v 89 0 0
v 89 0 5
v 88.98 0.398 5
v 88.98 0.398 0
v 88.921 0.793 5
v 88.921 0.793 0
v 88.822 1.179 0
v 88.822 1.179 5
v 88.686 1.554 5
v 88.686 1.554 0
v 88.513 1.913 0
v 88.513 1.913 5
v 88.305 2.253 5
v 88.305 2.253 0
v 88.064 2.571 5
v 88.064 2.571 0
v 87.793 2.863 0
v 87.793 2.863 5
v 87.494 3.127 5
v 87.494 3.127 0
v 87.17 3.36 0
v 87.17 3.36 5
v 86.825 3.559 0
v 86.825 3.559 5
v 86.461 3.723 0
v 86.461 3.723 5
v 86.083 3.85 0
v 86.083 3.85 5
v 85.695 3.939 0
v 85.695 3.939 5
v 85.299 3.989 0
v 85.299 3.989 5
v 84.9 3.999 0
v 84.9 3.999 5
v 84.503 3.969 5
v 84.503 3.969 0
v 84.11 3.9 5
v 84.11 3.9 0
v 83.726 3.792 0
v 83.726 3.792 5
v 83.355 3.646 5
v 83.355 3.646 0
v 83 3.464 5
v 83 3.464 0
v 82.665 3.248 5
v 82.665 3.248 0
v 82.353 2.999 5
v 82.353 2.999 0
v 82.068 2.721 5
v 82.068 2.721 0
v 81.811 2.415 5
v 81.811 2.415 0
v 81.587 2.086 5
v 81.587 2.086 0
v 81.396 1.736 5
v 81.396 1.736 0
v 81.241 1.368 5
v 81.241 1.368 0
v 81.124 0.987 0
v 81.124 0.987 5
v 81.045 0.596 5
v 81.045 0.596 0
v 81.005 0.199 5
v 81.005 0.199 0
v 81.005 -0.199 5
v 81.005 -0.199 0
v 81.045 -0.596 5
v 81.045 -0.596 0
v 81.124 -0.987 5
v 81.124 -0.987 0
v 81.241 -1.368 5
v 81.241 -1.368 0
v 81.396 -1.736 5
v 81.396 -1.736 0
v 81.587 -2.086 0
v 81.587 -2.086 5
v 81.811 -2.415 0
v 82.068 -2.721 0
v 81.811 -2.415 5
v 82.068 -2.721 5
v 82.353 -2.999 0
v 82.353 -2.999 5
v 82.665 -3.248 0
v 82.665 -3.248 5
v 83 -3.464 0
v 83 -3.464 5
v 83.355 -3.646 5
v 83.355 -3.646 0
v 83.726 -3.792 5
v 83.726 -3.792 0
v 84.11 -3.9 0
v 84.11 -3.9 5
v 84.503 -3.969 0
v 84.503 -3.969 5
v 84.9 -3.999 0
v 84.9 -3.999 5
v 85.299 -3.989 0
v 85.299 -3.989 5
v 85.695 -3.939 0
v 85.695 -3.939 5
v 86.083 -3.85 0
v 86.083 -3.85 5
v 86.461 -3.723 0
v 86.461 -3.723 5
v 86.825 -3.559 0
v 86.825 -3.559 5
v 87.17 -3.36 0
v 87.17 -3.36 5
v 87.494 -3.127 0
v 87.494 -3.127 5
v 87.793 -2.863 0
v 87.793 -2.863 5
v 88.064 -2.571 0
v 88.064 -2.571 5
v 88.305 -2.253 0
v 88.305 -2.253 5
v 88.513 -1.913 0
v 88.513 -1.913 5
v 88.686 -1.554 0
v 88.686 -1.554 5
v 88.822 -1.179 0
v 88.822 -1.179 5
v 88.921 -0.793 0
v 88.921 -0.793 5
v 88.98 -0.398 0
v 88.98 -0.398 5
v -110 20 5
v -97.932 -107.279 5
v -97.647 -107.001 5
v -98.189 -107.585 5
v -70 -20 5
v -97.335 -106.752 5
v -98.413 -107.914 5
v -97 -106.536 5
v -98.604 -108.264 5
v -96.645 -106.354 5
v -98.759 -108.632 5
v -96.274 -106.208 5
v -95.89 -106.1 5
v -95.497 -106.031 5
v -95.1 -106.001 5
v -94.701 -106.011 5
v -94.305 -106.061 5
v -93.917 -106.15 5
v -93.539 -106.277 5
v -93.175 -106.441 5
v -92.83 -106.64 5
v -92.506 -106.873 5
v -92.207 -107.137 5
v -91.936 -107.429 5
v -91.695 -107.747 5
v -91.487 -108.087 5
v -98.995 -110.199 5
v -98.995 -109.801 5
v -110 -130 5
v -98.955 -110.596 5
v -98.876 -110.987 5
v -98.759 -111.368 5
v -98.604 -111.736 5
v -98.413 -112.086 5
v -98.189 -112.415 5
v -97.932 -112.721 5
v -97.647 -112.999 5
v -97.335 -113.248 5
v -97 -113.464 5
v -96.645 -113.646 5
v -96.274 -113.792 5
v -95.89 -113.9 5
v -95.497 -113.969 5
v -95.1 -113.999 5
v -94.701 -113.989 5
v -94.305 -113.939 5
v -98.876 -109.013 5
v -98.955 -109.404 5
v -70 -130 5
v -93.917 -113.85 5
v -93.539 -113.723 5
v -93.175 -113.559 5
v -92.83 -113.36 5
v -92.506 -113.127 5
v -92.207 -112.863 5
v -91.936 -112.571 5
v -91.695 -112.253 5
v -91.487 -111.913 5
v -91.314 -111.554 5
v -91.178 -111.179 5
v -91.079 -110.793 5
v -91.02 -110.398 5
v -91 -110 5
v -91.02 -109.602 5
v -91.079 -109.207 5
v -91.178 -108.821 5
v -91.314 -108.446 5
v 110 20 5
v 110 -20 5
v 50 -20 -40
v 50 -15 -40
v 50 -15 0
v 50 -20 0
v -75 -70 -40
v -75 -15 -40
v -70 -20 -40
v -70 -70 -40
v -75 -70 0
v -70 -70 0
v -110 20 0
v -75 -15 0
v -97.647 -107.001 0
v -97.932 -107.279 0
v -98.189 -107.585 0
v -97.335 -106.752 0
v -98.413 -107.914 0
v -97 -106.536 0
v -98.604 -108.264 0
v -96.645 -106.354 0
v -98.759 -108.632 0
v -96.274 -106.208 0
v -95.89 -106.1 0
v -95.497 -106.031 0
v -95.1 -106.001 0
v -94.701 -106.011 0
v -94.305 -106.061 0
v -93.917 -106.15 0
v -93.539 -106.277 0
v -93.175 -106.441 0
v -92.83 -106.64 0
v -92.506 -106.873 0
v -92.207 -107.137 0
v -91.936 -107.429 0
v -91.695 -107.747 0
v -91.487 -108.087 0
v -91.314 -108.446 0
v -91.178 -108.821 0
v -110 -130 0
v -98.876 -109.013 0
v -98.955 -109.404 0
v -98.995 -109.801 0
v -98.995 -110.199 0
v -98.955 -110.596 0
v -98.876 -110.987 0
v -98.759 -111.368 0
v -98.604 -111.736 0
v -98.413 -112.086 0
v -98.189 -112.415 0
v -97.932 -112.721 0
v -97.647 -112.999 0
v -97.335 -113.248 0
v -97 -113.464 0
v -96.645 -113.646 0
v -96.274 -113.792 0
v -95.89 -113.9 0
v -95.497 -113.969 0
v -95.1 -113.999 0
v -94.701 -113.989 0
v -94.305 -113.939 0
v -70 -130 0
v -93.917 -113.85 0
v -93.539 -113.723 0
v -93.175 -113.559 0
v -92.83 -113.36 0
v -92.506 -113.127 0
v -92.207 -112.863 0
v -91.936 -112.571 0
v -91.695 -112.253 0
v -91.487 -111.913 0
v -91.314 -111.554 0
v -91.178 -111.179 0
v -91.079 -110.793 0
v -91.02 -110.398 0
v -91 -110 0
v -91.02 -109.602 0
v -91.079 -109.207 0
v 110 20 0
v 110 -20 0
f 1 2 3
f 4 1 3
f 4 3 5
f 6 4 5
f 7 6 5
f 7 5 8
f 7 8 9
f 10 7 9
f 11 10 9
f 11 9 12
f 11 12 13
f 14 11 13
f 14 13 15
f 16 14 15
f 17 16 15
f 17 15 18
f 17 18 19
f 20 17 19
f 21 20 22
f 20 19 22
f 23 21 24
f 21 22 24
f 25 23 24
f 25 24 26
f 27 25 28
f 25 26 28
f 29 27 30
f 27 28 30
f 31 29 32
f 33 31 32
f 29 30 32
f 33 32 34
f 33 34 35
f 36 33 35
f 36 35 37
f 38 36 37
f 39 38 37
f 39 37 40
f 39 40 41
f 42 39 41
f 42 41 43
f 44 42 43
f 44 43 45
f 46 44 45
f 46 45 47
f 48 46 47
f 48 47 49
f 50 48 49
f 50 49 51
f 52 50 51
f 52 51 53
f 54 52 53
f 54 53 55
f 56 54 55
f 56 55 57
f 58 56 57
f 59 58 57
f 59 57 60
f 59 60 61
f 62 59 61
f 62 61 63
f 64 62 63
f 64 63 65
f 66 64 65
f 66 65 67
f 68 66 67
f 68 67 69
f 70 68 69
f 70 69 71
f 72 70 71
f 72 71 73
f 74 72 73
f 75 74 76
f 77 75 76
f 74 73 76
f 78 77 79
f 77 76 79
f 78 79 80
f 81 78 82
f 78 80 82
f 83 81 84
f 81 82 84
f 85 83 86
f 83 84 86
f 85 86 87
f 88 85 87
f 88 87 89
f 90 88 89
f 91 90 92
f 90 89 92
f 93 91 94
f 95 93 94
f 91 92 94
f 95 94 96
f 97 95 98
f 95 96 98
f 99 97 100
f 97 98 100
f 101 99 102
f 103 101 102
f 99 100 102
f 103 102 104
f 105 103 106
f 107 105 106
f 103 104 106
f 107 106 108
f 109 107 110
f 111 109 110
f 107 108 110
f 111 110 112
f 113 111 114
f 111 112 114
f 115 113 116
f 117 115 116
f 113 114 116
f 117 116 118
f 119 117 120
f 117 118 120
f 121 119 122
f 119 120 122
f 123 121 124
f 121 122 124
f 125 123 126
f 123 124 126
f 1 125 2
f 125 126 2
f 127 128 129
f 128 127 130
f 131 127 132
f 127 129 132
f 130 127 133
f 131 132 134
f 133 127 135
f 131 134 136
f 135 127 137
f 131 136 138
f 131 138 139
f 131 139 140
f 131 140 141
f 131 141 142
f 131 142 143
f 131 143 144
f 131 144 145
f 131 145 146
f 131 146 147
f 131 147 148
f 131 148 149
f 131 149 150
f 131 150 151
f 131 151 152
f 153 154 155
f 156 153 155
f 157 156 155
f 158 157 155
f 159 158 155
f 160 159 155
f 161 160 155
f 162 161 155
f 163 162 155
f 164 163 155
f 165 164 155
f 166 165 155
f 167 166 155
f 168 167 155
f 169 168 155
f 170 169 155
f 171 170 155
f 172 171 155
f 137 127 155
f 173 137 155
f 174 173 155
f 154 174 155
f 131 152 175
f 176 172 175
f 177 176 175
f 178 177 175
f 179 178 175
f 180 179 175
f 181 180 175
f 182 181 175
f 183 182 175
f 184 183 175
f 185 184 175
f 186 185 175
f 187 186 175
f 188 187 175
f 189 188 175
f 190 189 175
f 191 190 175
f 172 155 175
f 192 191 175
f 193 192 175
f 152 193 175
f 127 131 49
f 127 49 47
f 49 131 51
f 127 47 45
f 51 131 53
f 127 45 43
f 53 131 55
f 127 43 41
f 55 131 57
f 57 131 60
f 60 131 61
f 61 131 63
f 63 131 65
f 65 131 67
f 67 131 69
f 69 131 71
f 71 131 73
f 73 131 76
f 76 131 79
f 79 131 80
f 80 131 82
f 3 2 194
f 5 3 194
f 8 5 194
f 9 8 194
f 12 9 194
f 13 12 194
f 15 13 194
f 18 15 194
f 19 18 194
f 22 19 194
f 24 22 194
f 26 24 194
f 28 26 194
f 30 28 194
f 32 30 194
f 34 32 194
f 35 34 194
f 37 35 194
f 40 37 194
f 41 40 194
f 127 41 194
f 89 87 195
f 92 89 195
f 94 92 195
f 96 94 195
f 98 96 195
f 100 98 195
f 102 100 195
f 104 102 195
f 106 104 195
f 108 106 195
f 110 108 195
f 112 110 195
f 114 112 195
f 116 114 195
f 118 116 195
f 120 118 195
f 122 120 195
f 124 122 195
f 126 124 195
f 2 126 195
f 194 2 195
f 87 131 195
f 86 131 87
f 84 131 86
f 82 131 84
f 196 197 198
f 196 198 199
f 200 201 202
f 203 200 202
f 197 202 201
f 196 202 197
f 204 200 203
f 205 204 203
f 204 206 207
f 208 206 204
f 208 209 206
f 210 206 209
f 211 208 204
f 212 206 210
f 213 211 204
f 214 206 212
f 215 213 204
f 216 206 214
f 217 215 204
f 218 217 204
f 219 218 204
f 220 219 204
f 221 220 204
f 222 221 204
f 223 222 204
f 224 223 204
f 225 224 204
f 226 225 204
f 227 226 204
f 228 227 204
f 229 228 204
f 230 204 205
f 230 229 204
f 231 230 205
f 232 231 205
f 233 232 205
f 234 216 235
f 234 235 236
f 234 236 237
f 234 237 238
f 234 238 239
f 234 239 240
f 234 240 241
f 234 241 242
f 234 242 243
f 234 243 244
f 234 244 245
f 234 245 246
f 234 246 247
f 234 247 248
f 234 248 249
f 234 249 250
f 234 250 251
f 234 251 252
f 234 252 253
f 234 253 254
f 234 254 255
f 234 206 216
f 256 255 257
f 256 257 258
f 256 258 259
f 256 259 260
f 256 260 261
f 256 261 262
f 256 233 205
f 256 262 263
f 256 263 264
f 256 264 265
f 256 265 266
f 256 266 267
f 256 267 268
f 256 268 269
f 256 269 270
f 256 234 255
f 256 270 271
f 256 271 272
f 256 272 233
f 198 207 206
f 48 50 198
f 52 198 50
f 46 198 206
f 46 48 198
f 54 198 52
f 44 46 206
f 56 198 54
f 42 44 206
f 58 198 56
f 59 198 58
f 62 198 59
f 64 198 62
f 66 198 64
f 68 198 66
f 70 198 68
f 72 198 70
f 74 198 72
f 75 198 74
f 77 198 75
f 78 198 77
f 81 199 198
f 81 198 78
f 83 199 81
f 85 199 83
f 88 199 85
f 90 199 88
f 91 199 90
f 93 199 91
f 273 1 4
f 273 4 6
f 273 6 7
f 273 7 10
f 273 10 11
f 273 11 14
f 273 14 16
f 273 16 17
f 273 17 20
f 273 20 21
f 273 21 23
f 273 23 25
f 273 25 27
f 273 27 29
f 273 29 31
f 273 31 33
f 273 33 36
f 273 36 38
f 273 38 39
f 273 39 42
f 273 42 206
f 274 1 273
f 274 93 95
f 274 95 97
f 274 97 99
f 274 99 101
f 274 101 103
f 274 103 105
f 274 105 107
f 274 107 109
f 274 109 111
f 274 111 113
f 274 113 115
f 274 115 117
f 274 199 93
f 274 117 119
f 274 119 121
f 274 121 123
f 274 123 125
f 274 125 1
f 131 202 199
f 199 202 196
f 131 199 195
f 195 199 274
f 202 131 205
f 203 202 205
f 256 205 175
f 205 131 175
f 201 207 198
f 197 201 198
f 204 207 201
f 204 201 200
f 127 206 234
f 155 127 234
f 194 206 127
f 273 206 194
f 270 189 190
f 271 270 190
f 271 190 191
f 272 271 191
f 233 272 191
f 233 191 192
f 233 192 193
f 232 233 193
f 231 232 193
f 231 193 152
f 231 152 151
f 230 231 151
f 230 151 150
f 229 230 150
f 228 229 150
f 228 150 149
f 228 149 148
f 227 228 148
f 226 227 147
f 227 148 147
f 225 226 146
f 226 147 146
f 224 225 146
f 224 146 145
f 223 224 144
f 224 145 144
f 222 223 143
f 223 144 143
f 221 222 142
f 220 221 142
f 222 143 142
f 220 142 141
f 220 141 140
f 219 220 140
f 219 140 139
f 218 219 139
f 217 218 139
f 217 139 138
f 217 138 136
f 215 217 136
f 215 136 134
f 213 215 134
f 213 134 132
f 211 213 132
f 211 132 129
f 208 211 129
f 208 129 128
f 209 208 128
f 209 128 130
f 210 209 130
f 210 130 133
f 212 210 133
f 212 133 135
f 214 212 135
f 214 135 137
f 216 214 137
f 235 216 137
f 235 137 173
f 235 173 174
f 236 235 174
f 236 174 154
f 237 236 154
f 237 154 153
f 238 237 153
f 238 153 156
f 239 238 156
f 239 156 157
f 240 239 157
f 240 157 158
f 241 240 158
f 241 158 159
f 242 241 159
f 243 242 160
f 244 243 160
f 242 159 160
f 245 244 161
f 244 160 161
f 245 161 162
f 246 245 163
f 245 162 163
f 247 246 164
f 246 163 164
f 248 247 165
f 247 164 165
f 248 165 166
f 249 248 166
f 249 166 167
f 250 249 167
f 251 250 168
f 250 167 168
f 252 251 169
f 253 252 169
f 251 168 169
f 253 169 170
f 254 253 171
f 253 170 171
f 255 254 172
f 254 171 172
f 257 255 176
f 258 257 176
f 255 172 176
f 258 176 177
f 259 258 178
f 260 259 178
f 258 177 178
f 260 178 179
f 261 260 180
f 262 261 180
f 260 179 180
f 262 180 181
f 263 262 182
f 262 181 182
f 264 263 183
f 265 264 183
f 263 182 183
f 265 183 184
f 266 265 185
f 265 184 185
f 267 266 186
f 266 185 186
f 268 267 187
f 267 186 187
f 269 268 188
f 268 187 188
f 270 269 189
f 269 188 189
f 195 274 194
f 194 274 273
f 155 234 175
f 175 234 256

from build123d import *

# Parameters (mm, degrees)
F0_W     = 220
F0_H     = 40
F1_DEPTH = 5
F2_W     = 120
F2_H     = 5
F3_DEPTH = 40
F4_W     = 40
F4_H     = 110
F5_DEPTH = 5
F6_W     = 5
F6_H     = 55
F7_DEPTH = 40
F8_R     = 4
F9_DEPTH = 25


with BuildPart() as f1:
    # F0 (on Top) → F1 (new body)
    with BuildSketch(Plane.XY):
        Rectangle(F0_W, F0_H)
    extrude(amount=F1_DEPTH)

    # F2 (on face) → F3 (join)
    with BuildSketch(Plane(origin=(0, 0, 0), x_dir=(1, 0, 0), z_dir=(0, 0, -1))):
        with Locations((-10, 17.5)):
            Rectangle(F2_W, F2_H)
    extrude(amount=F3_DEPTH)

    # F4 (on face) → F5 (join)
    with BuildSketch(Plane(origin=(0, 0, 0), x_dir=(1, 0, 0), z_dir=(0, 0, -1))):
        with Locations((-90, 75)):
            Rectangle(F4_W, F4_H)
    extrude(amount=-F5_DEPTH)

    # F6 (on face) → F7 (join)
    with BuildSketch(Plane(origin=(0, 0, 0), x_dir=(1, 0, 0), z_dir=(0, 0, -1))):
        with Locations((-72.5, 42.5)):
            Rectangle(F6_W, F6_H)
        Polygon((-75, 15), (-70, 15), (-70, 20), (-70, 70), (-75, 70), align=None)
    extrude(amount=F7_DEPTH)

    # F8 (on face) → F9 (cut)
    with BuildSketch(Plane.XY.offset(5)):
        with Locations((-95, -110)):
            Circle(F8_R)
        with Locations((85, 0)):
            Circle(F8_R)
    extrude(amount=-F9_DEPTH, mode=Mode.SUBTRACT)


solid = f1.part
